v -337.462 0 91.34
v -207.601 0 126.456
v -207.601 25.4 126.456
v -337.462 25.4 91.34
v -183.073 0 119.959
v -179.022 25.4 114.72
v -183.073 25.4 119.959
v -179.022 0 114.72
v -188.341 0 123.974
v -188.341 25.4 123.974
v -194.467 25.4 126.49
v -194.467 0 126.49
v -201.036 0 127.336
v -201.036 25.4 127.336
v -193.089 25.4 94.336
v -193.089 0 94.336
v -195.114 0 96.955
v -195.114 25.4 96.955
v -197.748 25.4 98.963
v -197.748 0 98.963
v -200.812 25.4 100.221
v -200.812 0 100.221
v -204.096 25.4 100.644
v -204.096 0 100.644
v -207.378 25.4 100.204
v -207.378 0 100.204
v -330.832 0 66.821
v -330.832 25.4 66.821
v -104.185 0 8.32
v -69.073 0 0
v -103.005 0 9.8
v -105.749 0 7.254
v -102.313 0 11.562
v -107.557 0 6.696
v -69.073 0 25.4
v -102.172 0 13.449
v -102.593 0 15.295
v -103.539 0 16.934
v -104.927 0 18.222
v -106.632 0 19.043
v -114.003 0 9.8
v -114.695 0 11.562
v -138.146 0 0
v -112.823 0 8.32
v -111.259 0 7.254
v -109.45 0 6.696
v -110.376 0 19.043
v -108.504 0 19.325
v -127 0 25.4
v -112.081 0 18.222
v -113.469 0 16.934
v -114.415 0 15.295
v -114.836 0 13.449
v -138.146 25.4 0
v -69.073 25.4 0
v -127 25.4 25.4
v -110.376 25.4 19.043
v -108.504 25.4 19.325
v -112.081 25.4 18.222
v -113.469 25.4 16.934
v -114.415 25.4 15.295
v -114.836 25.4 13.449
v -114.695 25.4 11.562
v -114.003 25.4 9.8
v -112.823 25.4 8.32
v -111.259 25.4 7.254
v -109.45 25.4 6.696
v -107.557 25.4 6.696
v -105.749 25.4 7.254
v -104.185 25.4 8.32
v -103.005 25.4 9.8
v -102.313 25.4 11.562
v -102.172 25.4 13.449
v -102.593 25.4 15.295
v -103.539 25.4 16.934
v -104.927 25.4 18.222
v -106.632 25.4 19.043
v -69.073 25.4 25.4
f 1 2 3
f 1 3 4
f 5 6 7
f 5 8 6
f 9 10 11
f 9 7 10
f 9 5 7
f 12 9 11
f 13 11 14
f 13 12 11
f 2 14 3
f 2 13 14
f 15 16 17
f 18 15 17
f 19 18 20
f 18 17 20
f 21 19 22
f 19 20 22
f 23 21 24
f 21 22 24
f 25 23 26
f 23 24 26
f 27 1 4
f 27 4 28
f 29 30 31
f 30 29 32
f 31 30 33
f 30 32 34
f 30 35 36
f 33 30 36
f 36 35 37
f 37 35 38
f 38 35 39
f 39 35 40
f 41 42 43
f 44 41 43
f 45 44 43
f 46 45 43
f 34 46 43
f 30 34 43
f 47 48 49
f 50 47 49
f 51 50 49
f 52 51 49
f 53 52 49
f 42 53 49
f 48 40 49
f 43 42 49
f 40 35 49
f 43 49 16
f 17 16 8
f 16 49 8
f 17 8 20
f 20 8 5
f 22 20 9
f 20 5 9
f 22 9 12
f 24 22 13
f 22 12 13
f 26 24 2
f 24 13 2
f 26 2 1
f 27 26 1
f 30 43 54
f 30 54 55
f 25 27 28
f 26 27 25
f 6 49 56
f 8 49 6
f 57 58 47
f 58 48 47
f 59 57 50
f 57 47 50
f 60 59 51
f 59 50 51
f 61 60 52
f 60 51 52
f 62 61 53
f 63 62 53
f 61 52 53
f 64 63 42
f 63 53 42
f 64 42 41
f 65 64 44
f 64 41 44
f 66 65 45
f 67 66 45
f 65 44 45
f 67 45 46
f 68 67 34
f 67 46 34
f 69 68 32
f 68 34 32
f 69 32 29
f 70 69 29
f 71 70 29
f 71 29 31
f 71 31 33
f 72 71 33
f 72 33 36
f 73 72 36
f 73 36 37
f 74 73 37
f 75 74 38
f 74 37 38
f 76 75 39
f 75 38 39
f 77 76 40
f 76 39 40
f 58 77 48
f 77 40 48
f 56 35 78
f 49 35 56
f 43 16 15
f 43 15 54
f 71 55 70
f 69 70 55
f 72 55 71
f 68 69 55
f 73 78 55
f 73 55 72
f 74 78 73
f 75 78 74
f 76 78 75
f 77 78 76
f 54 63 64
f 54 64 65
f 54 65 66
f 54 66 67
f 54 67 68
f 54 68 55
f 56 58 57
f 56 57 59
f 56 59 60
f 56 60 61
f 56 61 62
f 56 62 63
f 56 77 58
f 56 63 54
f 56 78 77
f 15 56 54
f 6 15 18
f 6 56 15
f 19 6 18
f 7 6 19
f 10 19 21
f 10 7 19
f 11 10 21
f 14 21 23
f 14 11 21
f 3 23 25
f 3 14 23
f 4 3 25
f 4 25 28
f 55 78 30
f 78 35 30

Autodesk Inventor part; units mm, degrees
ref_plane "YZ Plane" through (0, 0, 0) normal (1, 0, 0) x (0, 1, 0)
ref_plane "XZ Plane" through (0, 0, 0) normal (0, 1, 0) x (-1, 0, 0)
ref_plane "XY Plane" through (0, 0, 0) normal (0, 0, 1) x (1, 0, 0)
sketch "Sketch2" plane through (0, 0, 0) normal (0, 1, 0) x (-1, 0, 0)
  line L0 (69.0728, 25.4) -> (127, 25.4)
  line L1 (127, 25.4) -> (179.0216, 114.7196)
  line L2 (207.6006, 126.4556) -> (337.4623, 91.34)
  line L3 (337.4623, 91.34) -> (330.8321, 66.8206)
  line L4 (330.8321, 66.8206) -> (207.3781, 100.2035)
  line L5 (193.0887, 94.3355) -> (138.1457, 0)
  line L6 (138.1457, 0) -> (69.0728, 0)
  arc A0 (207.3781, 100.2035) -> (193.0887, 94.3355) centre (204.063, 87.9438) ccw
  arc A1 (207.6006, 126.4556) -> (179.0216, 114.7196) centre (200.9703, 101.9363) ccw
  line L7 (69.0728, 25.4) -> (69.0728, 0)
  point P0 (0, 0)
  dimension "d6" = 25.4
  dimension "d7" = 12.7
  dimension "d8" = 25.4
extrude "Extrusion1" add sketch "Sketch2" along normal blind 25.4
sketch "Sketch3" plane through (0, 25.4, 0) normal (0, 1, 0) x (1, 0, 0)
  point P0 (0, 0)
  point P1 (-108.5039, -12.9749)
hole "Hole1" at (-108.5039, 25.4, 12.9749) direction (0, -1, 0) diameter 12.7 depth 38.1 tip angle 118
properties part number "Scissor"
